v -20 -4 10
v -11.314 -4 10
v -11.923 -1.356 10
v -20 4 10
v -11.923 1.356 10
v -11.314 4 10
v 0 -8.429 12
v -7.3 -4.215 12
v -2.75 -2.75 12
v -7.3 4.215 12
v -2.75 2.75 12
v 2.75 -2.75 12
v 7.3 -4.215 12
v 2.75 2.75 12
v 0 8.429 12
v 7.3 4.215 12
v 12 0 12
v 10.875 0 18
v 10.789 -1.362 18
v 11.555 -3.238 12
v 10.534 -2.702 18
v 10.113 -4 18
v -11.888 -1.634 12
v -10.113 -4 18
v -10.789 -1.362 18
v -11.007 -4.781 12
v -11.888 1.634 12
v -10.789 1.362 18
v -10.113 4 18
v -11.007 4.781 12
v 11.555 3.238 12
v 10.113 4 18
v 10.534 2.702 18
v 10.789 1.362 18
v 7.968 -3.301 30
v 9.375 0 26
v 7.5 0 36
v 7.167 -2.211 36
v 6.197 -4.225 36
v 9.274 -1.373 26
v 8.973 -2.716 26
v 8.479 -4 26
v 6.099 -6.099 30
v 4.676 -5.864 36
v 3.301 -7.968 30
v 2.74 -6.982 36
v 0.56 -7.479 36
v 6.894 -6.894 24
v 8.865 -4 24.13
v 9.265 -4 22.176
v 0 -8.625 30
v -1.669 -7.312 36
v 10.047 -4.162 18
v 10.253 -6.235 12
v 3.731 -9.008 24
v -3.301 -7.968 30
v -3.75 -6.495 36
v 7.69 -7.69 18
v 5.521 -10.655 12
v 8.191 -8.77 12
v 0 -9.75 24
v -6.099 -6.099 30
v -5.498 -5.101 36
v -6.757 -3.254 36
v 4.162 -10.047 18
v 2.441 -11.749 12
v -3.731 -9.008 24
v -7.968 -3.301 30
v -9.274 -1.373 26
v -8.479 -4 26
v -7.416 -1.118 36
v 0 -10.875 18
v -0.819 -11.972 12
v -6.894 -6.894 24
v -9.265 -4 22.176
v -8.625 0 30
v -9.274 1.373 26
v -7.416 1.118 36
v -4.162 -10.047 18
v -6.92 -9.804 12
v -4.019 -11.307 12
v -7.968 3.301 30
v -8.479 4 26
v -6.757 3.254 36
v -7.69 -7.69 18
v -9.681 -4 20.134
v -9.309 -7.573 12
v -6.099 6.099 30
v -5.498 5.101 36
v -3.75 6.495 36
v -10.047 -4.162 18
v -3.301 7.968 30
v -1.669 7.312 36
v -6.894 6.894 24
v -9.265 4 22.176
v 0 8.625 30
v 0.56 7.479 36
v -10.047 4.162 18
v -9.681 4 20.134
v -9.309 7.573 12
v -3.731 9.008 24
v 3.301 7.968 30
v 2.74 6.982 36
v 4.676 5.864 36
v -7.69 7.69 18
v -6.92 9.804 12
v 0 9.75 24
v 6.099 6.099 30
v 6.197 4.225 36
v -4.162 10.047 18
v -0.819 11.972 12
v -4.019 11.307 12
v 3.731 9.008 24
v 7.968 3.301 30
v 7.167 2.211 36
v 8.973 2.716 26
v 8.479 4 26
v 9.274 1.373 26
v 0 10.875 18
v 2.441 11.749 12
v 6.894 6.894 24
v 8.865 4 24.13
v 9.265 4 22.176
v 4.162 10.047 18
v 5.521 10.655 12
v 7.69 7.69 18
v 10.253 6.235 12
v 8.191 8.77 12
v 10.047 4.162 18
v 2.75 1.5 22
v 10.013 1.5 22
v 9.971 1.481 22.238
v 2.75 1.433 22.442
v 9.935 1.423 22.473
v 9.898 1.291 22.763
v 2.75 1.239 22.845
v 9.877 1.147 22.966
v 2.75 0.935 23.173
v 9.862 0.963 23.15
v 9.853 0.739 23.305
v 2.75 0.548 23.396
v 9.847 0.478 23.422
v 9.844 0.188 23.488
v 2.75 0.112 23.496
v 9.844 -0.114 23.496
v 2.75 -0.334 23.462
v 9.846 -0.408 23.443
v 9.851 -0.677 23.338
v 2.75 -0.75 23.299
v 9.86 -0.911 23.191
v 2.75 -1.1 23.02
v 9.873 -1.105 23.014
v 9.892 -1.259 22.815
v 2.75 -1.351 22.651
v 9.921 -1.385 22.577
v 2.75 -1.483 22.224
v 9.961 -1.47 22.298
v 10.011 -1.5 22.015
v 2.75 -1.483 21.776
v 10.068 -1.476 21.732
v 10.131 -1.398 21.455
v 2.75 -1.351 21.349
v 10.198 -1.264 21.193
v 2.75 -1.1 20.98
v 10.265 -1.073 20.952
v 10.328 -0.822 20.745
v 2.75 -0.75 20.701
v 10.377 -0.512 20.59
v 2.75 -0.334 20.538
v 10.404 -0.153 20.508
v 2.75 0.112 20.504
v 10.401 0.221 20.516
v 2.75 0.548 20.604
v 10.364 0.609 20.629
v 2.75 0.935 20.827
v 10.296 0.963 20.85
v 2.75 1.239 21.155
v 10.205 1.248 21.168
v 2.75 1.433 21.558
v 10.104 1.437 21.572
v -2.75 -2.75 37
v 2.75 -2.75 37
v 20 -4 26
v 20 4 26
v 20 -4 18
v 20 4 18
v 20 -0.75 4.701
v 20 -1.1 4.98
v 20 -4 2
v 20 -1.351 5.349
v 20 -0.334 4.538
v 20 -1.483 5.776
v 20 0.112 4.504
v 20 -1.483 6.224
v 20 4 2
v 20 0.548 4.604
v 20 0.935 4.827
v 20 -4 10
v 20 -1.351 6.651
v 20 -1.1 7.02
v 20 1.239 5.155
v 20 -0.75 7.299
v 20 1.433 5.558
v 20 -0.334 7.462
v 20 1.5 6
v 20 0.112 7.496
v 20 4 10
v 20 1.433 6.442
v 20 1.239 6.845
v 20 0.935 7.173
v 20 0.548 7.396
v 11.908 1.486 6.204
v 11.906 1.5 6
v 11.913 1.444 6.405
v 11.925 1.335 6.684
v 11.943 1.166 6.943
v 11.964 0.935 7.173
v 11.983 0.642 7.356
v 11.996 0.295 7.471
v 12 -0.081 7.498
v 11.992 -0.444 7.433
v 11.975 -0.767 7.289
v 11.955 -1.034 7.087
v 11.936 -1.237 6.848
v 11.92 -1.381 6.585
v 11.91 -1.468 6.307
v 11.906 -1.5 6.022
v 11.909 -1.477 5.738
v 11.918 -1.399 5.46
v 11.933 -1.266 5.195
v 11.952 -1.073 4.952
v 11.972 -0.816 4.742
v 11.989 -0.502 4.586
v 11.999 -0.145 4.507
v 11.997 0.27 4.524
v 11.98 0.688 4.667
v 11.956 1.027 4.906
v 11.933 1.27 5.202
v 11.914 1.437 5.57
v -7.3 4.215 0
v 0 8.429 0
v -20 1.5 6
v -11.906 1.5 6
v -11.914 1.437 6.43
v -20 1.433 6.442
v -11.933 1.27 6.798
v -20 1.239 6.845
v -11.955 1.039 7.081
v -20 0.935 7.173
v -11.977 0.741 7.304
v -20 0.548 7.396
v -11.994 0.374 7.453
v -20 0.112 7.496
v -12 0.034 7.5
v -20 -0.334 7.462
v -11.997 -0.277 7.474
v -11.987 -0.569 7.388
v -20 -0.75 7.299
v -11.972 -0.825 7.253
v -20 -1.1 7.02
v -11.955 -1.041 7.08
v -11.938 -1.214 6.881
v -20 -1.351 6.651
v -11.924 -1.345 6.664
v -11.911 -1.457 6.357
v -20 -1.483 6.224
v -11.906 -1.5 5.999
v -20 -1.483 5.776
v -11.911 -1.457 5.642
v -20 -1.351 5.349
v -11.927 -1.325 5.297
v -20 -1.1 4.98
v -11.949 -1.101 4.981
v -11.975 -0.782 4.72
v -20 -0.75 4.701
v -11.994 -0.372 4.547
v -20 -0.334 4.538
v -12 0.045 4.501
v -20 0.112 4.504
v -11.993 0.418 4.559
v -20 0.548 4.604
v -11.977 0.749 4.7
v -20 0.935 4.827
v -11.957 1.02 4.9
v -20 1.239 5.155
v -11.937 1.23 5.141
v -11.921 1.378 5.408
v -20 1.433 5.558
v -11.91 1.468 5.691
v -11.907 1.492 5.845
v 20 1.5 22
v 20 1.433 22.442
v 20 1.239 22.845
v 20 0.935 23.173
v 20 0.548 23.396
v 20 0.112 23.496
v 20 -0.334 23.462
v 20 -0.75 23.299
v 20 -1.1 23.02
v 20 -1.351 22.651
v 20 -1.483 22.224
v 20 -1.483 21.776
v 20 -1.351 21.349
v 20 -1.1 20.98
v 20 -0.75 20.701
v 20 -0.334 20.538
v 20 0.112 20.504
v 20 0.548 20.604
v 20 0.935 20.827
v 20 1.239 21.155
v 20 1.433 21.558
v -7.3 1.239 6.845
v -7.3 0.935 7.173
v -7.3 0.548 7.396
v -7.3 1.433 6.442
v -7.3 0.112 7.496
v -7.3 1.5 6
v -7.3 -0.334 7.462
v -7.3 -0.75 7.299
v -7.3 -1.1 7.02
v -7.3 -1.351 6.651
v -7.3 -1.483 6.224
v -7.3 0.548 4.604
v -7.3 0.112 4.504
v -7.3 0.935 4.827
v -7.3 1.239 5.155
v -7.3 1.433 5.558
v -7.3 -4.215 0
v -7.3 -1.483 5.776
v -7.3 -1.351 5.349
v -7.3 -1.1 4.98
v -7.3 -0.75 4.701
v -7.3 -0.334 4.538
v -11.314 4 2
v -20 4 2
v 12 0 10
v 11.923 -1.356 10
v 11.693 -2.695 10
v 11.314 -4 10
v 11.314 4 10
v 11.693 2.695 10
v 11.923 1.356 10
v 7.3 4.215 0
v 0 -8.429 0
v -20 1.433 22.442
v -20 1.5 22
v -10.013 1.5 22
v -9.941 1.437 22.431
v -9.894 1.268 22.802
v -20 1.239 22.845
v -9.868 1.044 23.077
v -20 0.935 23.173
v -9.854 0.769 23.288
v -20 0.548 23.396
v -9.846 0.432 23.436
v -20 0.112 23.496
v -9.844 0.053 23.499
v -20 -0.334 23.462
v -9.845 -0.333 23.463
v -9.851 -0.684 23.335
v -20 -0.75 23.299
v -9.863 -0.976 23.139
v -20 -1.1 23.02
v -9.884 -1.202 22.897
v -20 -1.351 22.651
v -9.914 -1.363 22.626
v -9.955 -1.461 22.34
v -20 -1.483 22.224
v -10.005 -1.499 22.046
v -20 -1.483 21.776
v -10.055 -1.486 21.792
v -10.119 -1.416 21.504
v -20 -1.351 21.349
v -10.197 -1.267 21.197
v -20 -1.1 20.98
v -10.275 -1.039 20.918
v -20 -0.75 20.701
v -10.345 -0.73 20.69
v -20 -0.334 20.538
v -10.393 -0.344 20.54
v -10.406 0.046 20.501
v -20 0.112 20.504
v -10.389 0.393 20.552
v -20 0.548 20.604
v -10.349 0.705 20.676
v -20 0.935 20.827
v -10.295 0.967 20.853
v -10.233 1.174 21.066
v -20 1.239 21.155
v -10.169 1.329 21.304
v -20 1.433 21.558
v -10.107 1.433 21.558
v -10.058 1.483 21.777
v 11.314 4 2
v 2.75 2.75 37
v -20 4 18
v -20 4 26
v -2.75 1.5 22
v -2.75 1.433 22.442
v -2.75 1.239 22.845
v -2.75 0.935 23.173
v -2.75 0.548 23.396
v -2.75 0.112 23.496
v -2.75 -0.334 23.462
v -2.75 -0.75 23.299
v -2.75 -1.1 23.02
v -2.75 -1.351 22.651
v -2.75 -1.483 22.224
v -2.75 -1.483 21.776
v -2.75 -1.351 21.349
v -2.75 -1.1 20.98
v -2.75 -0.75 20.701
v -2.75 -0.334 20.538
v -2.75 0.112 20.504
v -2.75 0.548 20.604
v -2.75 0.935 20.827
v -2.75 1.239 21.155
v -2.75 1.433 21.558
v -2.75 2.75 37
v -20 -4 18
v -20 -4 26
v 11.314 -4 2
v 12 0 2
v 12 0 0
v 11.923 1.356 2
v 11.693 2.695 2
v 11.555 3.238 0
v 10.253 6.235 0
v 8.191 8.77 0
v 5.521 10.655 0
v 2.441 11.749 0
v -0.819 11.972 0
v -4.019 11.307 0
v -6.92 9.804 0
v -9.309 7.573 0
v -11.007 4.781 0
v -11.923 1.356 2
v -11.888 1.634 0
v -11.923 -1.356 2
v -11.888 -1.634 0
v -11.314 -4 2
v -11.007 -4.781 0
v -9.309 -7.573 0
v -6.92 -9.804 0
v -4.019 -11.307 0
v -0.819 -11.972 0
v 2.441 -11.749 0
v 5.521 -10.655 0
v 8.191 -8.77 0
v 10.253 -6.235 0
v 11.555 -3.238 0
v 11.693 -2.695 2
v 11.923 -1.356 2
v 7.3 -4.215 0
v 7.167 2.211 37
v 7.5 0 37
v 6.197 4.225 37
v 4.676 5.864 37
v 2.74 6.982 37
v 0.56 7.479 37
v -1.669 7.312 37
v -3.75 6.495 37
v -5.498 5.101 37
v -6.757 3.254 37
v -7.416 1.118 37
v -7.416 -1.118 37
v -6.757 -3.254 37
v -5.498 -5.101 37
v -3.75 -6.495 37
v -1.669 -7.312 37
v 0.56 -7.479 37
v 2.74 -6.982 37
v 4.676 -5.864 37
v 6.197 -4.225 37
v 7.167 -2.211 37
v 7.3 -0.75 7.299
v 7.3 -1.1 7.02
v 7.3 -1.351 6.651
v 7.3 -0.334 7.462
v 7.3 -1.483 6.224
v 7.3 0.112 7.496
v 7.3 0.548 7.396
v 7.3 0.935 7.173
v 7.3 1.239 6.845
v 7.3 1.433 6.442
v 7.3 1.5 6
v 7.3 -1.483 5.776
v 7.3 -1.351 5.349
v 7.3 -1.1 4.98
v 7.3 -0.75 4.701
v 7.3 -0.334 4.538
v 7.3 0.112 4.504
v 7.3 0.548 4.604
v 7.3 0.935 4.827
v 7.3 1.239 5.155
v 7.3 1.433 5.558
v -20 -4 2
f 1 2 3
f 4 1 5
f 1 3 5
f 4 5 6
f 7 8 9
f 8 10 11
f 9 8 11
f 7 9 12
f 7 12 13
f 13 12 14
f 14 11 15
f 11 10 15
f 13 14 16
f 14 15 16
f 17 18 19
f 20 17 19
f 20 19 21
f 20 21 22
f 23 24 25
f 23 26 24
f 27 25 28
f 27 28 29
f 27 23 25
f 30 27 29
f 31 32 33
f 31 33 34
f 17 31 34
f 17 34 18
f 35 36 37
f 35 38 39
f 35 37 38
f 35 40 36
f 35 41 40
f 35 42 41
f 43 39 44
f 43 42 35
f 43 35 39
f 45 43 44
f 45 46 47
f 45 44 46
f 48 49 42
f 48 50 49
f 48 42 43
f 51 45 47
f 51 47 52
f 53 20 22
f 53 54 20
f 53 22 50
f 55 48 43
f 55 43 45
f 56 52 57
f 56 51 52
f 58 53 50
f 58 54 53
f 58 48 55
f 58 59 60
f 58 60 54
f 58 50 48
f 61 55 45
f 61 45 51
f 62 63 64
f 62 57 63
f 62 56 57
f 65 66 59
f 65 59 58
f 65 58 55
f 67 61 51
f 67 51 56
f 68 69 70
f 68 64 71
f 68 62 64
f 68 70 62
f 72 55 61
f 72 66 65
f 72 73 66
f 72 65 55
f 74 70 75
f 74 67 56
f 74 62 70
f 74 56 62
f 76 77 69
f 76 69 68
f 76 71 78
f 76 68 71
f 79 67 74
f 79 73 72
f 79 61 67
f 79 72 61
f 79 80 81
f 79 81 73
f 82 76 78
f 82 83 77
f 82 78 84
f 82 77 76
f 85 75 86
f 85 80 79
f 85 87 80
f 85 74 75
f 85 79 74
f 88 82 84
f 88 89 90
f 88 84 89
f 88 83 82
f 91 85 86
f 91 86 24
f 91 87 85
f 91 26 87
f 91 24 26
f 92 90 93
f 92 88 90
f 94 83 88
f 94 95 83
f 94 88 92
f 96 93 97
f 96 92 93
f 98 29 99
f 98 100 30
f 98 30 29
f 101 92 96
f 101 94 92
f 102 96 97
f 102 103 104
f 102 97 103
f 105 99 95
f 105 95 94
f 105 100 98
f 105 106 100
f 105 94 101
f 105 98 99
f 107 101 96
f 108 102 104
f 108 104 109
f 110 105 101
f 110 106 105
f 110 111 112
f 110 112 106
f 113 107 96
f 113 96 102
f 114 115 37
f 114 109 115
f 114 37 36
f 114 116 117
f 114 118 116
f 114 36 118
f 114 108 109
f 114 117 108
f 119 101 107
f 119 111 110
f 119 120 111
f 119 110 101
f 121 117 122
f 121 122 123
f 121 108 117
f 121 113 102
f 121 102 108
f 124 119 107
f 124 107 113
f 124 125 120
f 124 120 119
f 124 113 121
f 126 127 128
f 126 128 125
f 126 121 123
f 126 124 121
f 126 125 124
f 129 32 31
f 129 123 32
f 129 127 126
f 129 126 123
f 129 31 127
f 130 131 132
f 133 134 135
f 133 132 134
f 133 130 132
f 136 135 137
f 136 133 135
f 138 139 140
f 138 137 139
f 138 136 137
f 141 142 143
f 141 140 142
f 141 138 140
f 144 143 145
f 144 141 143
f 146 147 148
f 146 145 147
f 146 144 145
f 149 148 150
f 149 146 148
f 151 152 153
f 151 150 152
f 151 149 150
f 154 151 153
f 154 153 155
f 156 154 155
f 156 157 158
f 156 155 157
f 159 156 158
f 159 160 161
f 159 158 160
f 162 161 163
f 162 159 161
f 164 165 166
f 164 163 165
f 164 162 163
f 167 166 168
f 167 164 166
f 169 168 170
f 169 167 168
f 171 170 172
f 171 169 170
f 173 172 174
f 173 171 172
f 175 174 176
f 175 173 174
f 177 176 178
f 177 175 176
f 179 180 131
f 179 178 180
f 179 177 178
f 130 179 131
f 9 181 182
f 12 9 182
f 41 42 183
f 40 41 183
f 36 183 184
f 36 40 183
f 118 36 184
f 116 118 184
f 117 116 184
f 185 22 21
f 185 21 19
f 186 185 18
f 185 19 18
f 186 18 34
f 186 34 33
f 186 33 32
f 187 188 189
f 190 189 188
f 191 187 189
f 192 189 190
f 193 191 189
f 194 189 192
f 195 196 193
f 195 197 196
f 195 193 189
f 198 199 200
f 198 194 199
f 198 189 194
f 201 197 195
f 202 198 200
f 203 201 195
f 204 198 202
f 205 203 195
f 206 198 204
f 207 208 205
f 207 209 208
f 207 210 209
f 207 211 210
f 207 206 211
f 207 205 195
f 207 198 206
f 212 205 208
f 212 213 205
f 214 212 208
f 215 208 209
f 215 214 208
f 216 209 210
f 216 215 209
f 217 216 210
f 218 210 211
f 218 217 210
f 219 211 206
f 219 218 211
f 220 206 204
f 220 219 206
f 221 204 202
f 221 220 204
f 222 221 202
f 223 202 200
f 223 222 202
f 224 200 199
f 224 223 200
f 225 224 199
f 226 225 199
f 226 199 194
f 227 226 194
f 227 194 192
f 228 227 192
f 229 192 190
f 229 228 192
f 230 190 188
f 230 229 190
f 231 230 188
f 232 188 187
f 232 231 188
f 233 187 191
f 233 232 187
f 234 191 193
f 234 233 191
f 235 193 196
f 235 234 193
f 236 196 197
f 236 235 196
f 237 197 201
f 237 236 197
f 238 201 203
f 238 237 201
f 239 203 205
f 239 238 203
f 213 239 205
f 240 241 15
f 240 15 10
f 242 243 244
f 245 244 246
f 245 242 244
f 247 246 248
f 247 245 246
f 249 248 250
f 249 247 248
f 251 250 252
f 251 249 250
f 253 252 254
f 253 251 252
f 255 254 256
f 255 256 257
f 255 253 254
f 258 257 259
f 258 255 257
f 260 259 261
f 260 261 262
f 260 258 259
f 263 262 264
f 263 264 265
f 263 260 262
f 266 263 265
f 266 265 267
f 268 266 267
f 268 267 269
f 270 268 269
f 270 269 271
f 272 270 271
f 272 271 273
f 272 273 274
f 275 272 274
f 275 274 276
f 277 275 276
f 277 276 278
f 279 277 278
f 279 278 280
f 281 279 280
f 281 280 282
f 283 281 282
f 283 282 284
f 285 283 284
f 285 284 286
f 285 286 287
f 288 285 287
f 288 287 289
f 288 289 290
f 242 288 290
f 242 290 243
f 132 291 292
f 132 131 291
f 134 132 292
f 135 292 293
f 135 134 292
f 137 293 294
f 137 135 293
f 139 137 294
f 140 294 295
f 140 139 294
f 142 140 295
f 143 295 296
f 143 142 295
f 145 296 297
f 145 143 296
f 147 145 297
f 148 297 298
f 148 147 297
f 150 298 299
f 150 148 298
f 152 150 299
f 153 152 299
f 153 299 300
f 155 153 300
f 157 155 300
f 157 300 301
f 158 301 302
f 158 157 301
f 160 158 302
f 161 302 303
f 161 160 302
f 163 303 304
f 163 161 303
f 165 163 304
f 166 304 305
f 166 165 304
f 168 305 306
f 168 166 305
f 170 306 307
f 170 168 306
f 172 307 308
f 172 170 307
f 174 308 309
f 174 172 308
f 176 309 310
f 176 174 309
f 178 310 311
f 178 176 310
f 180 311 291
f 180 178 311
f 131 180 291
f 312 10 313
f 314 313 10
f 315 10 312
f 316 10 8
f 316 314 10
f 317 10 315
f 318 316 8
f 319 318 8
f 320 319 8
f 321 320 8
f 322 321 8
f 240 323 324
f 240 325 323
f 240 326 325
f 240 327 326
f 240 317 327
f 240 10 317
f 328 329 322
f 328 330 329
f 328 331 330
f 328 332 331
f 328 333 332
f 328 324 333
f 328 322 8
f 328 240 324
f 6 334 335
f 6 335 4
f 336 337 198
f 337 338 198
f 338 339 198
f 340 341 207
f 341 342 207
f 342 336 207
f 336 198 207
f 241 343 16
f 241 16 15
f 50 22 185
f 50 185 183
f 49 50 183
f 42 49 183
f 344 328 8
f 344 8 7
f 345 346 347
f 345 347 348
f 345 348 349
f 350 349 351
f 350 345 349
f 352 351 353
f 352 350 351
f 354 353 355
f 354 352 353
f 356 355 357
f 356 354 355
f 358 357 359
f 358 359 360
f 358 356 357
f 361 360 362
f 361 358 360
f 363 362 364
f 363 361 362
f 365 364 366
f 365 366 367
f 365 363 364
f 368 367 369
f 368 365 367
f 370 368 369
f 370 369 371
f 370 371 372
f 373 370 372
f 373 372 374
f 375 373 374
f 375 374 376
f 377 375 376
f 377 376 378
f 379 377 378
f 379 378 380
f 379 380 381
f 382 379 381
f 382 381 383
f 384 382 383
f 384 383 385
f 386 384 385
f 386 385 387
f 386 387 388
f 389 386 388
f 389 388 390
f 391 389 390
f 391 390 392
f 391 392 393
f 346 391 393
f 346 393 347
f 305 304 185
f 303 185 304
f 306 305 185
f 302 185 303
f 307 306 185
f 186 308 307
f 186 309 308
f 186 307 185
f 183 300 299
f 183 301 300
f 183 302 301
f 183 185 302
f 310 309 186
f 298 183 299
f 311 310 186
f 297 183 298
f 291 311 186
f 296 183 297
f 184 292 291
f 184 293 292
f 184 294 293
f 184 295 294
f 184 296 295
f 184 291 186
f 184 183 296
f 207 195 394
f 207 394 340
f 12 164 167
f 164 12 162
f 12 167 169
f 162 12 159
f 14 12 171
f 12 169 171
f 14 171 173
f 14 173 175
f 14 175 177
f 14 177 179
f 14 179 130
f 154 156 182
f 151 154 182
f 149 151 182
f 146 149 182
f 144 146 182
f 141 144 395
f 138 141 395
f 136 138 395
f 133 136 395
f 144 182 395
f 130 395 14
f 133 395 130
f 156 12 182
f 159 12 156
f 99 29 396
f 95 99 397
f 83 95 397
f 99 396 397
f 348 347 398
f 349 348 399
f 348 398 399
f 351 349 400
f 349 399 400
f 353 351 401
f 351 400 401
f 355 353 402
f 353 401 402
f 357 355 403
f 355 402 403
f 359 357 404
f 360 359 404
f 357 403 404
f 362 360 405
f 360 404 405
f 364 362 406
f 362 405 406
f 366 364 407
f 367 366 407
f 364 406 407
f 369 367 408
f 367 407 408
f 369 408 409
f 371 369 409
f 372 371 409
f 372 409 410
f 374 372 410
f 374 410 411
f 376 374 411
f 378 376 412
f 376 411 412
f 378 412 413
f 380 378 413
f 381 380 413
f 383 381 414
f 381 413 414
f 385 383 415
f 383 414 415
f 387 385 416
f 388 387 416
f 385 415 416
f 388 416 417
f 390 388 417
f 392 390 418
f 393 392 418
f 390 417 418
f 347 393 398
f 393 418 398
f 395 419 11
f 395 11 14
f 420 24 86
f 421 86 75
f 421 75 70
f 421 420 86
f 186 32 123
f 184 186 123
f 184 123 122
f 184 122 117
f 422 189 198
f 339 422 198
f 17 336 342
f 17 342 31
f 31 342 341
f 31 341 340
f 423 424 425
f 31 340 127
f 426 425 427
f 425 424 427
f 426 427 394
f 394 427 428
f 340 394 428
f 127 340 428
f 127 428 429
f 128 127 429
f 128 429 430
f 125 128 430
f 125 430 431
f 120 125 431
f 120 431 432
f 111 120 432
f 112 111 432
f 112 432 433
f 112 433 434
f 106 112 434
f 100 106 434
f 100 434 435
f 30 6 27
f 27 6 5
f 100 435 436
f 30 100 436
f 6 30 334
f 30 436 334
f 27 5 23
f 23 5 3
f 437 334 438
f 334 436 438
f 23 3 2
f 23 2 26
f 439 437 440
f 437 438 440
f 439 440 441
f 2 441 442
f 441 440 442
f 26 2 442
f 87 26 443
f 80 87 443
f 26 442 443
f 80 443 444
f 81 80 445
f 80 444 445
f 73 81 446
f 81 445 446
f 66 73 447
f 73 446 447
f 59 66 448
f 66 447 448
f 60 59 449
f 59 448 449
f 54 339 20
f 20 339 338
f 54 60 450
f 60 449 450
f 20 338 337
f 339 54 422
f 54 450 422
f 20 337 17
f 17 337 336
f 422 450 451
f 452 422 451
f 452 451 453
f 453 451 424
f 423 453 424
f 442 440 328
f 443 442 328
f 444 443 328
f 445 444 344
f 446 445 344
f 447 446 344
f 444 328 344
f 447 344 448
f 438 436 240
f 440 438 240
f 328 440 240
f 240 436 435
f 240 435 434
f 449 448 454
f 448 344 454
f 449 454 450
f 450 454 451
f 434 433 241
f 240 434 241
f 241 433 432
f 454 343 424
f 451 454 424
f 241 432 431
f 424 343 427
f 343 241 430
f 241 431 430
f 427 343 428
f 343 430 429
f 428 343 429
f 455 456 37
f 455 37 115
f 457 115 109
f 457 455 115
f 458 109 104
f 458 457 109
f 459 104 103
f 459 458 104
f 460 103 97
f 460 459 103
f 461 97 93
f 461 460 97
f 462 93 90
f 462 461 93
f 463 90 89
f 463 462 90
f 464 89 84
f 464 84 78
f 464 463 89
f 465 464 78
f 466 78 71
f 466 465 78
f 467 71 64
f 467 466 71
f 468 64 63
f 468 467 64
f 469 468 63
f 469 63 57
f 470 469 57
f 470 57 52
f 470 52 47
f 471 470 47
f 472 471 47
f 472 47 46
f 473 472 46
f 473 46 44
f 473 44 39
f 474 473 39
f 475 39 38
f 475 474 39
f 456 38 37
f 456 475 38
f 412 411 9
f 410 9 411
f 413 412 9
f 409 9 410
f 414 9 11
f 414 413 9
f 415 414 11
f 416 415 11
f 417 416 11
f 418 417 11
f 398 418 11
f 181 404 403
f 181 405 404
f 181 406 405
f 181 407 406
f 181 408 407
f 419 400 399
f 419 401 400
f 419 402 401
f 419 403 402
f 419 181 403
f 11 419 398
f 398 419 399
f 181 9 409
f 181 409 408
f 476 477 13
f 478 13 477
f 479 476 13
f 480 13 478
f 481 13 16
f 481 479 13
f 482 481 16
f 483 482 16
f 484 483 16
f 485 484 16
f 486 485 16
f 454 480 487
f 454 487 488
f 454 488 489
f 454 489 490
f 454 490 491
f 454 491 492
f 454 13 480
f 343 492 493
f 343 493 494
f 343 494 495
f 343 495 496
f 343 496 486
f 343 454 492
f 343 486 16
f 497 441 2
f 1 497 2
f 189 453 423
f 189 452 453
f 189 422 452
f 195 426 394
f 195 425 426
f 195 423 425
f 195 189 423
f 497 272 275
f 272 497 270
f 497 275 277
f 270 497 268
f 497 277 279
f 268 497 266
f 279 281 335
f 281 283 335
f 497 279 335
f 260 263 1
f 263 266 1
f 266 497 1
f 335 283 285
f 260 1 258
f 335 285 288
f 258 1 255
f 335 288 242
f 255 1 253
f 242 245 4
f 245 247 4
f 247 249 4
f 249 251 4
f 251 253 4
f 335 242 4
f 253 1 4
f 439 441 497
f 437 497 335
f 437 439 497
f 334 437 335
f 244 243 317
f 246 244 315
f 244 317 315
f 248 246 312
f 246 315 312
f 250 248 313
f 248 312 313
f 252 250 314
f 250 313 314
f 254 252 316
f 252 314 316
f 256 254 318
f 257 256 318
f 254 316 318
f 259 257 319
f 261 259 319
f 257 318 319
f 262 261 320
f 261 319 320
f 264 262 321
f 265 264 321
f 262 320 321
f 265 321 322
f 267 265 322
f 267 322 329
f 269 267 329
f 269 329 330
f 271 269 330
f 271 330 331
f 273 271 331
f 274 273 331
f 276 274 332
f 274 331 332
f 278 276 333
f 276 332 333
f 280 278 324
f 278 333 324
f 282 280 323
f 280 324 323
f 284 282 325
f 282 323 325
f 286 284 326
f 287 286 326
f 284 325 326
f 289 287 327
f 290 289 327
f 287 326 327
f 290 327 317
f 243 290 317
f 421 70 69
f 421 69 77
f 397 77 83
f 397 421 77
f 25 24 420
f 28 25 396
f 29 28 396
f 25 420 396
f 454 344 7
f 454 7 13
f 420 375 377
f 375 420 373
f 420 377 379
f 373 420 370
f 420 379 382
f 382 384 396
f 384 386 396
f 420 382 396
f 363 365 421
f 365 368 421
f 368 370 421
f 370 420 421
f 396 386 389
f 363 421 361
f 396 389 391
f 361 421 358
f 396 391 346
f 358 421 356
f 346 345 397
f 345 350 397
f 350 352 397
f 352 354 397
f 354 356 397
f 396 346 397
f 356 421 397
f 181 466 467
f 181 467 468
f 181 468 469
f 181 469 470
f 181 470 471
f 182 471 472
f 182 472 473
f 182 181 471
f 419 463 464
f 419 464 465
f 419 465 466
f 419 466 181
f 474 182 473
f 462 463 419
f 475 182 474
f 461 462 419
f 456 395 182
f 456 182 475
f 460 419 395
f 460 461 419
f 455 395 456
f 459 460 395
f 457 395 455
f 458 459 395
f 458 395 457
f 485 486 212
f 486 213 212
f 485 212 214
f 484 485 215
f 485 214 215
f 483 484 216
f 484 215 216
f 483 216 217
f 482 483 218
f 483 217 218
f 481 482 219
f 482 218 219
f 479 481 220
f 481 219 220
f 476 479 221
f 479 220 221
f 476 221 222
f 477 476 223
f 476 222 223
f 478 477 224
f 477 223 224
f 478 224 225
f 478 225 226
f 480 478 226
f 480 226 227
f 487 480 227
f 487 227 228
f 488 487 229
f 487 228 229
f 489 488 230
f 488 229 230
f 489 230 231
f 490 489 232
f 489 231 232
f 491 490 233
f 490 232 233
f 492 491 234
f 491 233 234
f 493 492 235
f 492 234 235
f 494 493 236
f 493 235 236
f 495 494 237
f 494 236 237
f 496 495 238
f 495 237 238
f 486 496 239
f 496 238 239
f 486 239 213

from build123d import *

# Parameters (mm, degrees)
F0_R        = 12
F1_DEPTH    = 12
F3_R        = 7.5
F3_W        = 5.5
F3_H        = 5.5
F4_DEPTH    = 1
F4_FACE_R   = 7.5
F1_FACE_R   = 12
F6_DEPTH    = 25
F7_DEPTH    = 12
F8_W        = 8
F8_H        = 8
F8_R        = 1.5
F9_DEPTH    = 20
F9_FACE_W   = 14.6
F9_FACE_H   = 8
F10_DEPTH   = 8
F9_FACE_W_2 = 5.5
F9_FACE_H_2 = 5.5
F11_DEPTH   = 25
F12_DEPTH   = 12.5


with BuildPart() as f1:
    # F0 (on Top) → F1 (new body)
    with BuildSketch(Plane.XY):
        Circle(F0_R)
        Polygon((-7.3, -4.214657), (-7.3, 4.214657), (0, 8.429314), (7.3, 4.214657), (7.3, -4.214657), (0, -8.429314), align=None, mode=Mode.SUBTRACT)
        Polygon((0, 8.429314), (-7.3, 4.214657), (-7.3, -4.214657), (0, -8.429314), (7.3, -4.214657), (7.3, 4.214657), align=None)
    extrude(amount=F1_DEPTH)



with BuildPart() as f4:
    # F3 (on offset) → F4 (new body)
    with BuildSketch(Plane.XY.offset(37)):
        Circle(F3_R)
        Rectangle(F3_W, F3_H, mode=Mode.SUBTRACT)
        Rectangle(F3_W, F3_H)
    extrude(amount=-F4_DEPTH)


with BuildPart() as f1_1:
    add(f1.part)

    add(f4.part)  # F5 merges F4
    # F4_face (on face) → F5 section 0
    with BuildSketch(Plane(origin=(0, 0, 36), x_dir=(1, 0, 0), z_dir=(0, 0, -1))):
        Circle(F4_FACE_R)
    # F1_face (on face) → F5 section 1
    with BuildSketch(Plane.XY.offset(12)):
        Circle(F1_FACE_R)
    loft()

    # F3 (on offset) → F6 (cut)
    with BuildSketch(Plane.XY.offset(37)):
        Rectangle(F3_W, F3_H)
    extrude(amount=-F6_DEPTH, mode=Mode.SUBTRACT)

    # F0 (on Top) → F7 (cut)
    with BuildSketch(Plane.XY):
        Polygon((0, 8.429314), (-7.3, 4.214657), (-7.3, -4.214657), (0, -8.429314), (7.3, -4.214657), (7.3, 4.214657), align=None)
    extrude(amount=F7_DEPTH, mode=Mode.SUBTRACT)

    # F8 (on Right) → F9 (join, symmetric)
    with BuildSketch(Plane.YZ):
        with Locations((0, 22)):
            Rectangle(F8_W, F8_H)
        with Locations((0, 22)):
            Circle(F8_R, mode=Mode.SUBTRACT)
        with Locations((0, 6)):
            Rectangle(F8_W, F8_H)
        with Locations((0, 6)):
            Circle(F8_R, mode=Mode.SUBTRACT)
    extrude(amount=F9_DEPTH, both=True)

    # F9_face (on face) → F10 (cut)
    with BuildSketch(Plane(origin=(0, 0, 2), x_dir=(1, 0, 0), z_dir=(0, 0, -1))):
        Rectangle(F9_FACE_W, F9_FACE_H)
    extrude(amount=-F10_DEPTH, mode=Mode.SUBTRACT)

    # F9_face (on face) → F11 (cut)
    with BuildSketch(Plane(origin=(0, 0, 2), x_dir=(1, 0, 0), z_dir=(0, 0, -1))):
        Rectangle(F9_FACE_W_2, F9_FACE_H_2)
    extrude(amount=-F11_DEPTH, mode=Mode.SUBTRACT)

    # F8 (on Right) → F12 (cut, symmetric)
    with BuildSketch(Plane.YZ):
        with Locations((0, 22)):
            Circle(F8_R)
        with Locations((0, 6)):
            Circle(F8_R)
    extrude(amount=F12_DEPTH, both=True, mode=Mode.SUBTRACT)


solid = f1_1.part
